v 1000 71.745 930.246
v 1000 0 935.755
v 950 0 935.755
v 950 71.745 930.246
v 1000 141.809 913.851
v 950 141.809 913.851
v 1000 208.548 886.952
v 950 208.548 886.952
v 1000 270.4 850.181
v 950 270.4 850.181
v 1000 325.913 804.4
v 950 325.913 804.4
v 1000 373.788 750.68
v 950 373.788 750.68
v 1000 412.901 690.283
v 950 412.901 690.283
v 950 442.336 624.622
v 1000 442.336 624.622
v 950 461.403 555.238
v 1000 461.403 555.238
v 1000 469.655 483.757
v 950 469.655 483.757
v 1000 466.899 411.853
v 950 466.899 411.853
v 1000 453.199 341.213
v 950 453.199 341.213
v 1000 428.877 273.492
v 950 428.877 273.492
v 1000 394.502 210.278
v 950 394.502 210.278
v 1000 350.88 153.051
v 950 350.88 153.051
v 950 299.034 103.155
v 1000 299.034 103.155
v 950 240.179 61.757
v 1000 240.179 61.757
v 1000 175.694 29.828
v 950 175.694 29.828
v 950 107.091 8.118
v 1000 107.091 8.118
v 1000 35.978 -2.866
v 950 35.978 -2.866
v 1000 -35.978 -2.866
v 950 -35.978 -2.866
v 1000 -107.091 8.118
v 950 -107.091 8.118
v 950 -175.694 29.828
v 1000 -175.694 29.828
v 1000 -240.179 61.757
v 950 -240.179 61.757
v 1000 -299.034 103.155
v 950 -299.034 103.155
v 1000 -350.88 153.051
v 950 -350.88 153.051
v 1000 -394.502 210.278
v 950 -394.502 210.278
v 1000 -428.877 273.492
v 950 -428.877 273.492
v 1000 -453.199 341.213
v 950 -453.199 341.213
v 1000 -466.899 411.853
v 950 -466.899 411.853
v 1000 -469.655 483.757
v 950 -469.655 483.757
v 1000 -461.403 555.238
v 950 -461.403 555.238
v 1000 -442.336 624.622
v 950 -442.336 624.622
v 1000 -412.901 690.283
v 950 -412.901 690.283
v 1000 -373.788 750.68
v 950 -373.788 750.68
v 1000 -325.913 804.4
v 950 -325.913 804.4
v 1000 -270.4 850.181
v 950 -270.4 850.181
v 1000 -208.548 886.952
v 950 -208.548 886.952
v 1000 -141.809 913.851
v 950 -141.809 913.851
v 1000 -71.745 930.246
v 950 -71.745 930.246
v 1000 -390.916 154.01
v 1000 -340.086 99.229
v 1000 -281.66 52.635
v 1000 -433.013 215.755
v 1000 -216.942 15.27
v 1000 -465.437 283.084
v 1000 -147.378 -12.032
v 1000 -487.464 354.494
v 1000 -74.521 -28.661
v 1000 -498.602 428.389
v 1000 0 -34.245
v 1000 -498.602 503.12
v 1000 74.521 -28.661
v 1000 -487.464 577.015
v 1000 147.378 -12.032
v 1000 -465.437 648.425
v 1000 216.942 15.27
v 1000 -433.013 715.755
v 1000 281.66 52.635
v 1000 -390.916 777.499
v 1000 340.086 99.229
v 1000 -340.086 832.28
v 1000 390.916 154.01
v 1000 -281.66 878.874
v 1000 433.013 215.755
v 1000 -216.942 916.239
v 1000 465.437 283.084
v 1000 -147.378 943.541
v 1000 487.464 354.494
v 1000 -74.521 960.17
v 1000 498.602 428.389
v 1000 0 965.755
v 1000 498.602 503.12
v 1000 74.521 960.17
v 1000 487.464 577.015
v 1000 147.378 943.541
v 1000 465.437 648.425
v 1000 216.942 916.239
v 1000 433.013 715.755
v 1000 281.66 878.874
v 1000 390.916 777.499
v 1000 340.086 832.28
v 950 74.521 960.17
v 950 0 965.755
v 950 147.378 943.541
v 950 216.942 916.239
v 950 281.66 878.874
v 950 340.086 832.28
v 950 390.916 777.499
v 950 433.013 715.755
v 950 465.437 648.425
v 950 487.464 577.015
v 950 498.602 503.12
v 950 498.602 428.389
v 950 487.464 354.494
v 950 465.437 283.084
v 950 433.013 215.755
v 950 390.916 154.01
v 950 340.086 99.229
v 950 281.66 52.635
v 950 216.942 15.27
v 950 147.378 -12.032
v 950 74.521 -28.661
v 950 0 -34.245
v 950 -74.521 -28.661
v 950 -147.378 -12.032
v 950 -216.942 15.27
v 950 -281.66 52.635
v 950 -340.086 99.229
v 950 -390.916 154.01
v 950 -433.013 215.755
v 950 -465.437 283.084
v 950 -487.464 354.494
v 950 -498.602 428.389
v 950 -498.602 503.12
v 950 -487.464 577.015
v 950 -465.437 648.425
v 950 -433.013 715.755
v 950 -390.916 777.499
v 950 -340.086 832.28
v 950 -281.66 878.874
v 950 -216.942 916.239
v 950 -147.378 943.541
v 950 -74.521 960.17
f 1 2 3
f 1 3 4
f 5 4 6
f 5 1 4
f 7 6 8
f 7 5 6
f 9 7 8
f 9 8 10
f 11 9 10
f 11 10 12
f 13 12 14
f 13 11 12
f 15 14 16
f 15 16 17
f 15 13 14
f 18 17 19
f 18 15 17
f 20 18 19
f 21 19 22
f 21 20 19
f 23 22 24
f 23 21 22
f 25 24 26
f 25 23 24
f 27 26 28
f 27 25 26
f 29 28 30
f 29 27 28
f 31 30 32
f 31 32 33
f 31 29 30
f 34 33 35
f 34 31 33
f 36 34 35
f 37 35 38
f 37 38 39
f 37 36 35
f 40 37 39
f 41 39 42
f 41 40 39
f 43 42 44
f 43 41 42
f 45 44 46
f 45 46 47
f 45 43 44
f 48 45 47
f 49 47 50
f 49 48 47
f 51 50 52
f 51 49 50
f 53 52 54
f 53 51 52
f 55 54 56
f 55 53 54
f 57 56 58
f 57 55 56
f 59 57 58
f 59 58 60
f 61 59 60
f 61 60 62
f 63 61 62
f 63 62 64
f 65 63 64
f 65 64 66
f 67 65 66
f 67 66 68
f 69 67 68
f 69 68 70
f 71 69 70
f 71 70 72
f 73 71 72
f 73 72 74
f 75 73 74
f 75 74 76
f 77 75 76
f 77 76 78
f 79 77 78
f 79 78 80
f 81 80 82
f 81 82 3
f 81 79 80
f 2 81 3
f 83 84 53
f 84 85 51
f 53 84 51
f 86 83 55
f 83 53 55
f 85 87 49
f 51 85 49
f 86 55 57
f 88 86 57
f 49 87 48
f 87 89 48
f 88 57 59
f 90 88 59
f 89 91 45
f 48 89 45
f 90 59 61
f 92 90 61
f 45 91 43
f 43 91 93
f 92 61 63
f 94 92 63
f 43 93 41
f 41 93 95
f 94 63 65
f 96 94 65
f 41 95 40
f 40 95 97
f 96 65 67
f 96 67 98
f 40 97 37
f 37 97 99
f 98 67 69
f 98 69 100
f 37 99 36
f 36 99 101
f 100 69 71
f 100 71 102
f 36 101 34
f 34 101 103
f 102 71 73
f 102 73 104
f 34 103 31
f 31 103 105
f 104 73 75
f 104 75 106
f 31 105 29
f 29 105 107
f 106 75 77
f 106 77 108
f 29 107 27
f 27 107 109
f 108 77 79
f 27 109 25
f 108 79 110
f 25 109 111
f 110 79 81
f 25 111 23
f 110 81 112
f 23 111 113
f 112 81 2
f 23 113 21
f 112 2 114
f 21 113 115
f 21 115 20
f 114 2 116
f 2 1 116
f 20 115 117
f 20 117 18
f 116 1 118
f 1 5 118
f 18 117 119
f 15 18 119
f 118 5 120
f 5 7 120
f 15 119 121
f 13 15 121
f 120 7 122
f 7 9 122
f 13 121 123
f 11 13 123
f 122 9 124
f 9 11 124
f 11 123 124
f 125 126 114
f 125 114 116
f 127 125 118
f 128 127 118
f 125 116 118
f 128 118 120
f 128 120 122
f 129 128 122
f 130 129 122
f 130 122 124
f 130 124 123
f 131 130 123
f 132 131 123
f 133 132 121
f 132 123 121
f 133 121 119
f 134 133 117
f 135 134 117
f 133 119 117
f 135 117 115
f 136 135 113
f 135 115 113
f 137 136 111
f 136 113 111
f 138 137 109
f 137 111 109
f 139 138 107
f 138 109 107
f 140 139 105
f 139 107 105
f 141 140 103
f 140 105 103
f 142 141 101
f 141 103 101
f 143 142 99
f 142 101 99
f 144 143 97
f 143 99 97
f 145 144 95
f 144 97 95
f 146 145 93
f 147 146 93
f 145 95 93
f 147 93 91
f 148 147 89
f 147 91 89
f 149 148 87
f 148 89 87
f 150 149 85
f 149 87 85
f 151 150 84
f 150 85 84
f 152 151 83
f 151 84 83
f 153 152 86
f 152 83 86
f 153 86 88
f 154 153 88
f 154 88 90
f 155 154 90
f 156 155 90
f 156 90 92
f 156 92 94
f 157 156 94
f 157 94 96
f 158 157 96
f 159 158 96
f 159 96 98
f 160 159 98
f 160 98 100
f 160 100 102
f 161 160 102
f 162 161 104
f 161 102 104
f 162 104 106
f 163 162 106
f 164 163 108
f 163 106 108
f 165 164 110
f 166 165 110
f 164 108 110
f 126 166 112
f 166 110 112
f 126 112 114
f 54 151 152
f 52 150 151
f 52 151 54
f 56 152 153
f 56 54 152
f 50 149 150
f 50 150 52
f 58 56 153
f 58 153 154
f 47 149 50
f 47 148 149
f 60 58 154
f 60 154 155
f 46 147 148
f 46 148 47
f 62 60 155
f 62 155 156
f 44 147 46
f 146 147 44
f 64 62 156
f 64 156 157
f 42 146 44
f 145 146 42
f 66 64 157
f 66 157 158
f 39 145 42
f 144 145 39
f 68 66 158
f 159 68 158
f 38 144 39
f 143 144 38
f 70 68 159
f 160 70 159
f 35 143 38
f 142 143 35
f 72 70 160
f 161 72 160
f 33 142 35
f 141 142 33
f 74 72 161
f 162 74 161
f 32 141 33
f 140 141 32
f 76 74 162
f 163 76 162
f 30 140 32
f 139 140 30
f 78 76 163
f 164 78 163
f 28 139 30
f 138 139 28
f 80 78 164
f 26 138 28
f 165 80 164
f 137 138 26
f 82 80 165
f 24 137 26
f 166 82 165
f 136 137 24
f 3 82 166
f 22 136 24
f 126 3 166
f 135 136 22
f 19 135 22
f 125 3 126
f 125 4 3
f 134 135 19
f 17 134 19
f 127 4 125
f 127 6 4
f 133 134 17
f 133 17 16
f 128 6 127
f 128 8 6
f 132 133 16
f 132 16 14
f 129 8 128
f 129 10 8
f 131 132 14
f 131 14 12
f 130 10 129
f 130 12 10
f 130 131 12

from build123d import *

# Parameters (mm, degrees)
CYLINDER001_R     = 470
CYLINDER001_DEPTH = 50
CYLINDER002_R     = 500
CYLINDER002_DEPTH = 50


with BuildPart() as cilindro001:
    # Cylinder001 → Cylinder001 (new body)
    with BuildSketch(Plane(origin=(1000, 0, 465.754524), x_dir=(0, 0, 1), z_dir=(-1, 0, 0))):
        Circle(CYLINDER001_R)
    extrude(amount=CYLINDER001_DEPTH)


with BuildPart() as cut:
    # Cylinder002 → Cylinder002 (new body)
    with BuildSketch(Plane(origin=(1000, 0, 465.754524), x_dir=(0, 0, 1), z_dir=(-1, 0, 0))):
        Circle(CYLINDER002_R)
    extrude(amount=CYLINDER002_DEPTH)

    # Cut: cut Cilindro001
    add(cilindro001.part, mode=Mode.SUBTRACT)


solid = cut.part
